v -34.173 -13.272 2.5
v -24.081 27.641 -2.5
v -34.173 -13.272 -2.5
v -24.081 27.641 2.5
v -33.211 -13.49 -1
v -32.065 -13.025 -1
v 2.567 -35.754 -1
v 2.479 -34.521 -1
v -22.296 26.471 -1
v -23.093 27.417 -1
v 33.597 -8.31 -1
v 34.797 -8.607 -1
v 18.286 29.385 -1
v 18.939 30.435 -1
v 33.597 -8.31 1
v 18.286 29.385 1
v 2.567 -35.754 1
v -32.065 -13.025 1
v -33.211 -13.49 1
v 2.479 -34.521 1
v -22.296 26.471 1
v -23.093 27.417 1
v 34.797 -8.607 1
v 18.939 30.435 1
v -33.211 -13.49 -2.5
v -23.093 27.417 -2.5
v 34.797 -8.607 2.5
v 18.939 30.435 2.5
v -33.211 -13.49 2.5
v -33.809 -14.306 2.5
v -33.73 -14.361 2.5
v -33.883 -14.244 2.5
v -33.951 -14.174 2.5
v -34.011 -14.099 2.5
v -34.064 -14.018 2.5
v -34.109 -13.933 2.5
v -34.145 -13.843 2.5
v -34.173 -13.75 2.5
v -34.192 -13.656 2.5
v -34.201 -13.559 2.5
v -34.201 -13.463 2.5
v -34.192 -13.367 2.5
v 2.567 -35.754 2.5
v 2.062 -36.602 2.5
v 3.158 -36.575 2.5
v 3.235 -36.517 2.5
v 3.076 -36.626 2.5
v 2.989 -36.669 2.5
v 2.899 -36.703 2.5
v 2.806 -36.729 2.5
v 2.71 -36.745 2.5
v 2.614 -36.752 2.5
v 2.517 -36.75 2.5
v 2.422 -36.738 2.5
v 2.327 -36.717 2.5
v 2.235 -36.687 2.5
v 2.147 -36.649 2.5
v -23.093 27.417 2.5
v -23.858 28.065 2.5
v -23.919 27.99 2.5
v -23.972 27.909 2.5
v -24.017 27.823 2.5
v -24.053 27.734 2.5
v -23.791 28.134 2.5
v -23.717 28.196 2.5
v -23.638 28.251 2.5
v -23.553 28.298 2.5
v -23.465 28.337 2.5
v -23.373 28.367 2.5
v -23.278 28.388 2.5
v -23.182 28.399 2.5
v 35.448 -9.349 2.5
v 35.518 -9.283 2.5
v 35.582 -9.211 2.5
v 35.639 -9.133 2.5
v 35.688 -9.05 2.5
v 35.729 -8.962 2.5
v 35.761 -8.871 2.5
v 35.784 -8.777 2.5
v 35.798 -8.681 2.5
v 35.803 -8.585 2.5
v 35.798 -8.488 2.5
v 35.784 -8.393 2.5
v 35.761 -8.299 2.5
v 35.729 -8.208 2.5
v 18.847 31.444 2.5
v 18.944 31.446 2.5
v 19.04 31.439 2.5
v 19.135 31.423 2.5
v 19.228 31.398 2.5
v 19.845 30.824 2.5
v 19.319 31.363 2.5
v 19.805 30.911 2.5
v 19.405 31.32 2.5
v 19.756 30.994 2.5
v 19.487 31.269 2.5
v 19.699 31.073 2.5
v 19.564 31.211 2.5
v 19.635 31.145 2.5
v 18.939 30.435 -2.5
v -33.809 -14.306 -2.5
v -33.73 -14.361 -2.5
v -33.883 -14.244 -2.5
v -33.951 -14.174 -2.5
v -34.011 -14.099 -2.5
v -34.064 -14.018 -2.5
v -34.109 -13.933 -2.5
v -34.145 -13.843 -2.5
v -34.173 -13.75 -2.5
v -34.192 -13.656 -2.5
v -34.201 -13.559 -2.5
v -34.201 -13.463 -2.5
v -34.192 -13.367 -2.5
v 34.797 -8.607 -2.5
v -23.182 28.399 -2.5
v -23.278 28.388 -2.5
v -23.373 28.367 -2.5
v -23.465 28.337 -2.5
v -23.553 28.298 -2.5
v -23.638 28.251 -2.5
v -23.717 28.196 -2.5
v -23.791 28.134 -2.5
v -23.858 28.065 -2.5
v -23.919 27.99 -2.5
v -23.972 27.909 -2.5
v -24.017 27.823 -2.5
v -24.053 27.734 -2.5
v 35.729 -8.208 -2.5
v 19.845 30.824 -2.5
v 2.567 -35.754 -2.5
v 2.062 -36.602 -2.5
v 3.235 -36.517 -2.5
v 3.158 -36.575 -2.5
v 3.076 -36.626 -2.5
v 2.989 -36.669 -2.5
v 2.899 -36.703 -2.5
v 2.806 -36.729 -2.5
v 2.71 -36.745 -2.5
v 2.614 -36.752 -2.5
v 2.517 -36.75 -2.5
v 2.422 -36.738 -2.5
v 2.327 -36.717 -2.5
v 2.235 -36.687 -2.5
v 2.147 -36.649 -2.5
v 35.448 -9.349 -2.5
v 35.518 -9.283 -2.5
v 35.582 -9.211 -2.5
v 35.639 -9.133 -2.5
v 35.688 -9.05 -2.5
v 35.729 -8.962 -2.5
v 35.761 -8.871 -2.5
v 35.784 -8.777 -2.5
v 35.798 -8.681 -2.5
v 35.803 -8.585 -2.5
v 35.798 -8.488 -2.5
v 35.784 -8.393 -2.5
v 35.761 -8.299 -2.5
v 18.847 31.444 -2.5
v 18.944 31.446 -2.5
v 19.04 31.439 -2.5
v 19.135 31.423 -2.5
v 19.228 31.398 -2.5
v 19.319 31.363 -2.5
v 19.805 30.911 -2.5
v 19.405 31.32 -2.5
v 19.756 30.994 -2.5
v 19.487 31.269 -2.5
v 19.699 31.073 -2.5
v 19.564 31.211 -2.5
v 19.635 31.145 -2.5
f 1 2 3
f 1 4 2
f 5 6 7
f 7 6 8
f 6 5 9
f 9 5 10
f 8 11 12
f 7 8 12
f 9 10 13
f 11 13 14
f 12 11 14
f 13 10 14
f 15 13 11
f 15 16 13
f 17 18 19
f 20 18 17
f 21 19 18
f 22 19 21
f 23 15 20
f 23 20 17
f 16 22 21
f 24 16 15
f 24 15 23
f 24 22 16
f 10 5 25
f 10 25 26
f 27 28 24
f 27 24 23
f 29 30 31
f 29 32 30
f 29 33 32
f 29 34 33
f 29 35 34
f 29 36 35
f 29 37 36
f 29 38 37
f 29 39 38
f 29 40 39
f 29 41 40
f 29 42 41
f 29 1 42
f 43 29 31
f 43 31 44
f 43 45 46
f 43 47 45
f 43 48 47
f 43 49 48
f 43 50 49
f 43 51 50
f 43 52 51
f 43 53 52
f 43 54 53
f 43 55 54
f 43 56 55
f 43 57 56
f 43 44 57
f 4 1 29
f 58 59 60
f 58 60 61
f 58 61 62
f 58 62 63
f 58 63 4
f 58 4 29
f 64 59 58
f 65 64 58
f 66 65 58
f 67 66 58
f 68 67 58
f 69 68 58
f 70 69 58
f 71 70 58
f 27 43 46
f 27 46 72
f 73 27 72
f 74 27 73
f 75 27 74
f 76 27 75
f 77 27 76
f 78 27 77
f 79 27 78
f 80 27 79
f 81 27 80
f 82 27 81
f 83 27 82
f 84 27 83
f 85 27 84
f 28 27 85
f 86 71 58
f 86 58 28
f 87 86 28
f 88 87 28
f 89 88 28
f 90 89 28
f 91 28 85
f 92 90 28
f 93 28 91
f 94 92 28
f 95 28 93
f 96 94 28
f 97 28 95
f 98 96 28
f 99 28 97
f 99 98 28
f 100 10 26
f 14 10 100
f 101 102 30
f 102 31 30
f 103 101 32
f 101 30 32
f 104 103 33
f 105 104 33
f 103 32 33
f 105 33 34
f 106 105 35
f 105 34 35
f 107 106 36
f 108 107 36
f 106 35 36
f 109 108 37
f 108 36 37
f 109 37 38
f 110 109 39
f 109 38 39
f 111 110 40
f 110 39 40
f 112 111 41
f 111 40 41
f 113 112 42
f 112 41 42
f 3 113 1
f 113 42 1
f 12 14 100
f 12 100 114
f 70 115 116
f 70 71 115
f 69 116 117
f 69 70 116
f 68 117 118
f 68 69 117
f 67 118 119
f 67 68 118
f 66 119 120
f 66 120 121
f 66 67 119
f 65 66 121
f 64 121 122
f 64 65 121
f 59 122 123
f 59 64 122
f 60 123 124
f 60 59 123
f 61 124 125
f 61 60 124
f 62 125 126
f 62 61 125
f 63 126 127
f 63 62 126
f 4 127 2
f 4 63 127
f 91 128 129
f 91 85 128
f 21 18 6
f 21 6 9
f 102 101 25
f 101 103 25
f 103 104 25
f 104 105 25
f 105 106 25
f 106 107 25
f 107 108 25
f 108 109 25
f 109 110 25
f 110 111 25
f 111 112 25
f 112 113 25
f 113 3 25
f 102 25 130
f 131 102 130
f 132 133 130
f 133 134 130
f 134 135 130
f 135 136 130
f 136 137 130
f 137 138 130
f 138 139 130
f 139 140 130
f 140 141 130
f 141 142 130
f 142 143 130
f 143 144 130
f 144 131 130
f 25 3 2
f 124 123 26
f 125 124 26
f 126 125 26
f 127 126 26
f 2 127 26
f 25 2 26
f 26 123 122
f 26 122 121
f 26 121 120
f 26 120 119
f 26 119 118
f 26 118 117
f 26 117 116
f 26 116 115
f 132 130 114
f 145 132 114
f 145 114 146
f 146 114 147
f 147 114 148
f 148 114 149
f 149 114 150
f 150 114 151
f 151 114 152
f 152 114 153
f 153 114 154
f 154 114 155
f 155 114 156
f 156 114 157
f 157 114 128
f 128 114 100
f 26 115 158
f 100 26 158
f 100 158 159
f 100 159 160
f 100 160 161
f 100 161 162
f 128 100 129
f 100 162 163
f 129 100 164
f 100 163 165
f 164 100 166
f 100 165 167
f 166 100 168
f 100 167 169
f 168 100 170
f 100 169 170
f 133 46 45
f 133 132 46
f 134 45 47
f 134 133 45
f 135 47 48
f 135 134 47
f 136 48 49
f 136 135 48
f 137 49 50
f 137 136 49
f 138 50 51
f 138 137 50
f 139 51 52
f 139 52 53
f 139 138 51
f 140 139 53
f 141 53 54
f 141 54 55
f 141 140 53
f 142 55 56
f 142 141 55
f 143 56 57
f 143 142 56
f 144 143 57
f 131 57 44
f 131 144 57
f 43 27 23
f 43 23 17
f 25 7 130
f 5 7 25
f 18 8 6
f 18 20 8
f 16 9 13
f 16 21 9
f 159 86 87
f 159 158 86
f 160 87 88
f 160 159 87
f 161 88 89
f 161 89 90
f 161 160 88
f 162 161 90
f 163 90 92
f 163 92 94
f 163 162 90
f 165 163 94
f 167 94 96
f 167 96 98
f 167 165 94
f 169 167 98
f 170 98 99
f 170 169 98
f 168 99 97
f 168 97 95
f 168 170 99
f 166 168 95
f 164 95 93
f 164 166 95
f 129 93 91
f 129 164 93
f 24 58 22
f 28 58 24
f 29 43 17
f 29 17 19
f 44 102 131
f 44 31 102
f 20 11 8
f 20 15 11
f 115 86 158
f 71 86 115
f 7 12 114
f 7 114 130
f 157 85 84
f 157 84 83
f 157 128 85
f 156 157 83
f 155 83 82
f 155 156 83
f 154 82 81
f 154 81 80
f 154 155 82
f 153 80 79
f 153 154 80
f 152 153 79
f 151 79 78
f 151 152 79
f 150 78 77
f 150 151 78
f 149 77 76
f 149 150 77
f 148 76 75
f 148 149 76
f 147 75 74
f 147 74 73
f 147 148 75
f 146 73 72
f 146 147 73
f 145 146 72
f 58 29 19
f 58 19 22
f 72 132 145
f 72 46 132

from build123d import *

# Parameters (mm, degrees)
F1_DEPTH = 1
F2_DEPTH = 2.5
F3_R     = 1


with BuildPart() as f1:
    # F0 (on Top) → F1 (new body, symmetric)
    with BuildSketch(Plane.XY):
        Polygon((19.571643256, 31.4964826728), (-23.9069647124, 28.3466872622), (-34.3469600161, -13.9772664763), (2.6793760122, -36.9851130144), (36.0029054603, -8.8807904443), align=None)
        Polygon((-33.2106868902, -13.4901422574), (-23.0925543436, 27.4165569635), (18.9387034188, 30.4345063154), (34.7973167593, -8.6069976298), (2.5672210558, -35.7539233917), align=None, mode=Mode.SUBTRACT)
        Polygon((18.9387034188, 30.4345063154), (-23.0925543436, 27.4165569635), (-33.2106868902, -13.4901422574), (2.5672210558, -35.7539233917), (34.7973167593, -8.6069976298), align=None)
        Polygon((-32.949379101, -13.3121576596), (-22.8425323844, 27.2230387533), (18.8319176983, 30.1369208862), (34.4812975953, -8.5973973294), (2.4786961918, -35.4504046505), align=None, mode=Mode.SUBTRACT)
        Polygon((18.8319176983, 30.1369208862), (-22.8425323844, 27.2230387533), (-32.949379101, -13.3121576596), (2.4786961918, -35.4504046505), (34.4812975953, -8.5973973294), align=None)
        Polygon((-32.0654907905, -13.0249649382), (-22.2962593663, 26.4711584475), (18.2856446802, 29.3850405804), (33.5974092848, -8.310204608), (2.4786961918, -34.5210294816), align=None, mode=Mode.SUBTRACT)
    extrude(amount=F1_DEPTH, both=True)

    # F0 (on Top) → F2 (join, symmetric)
    with BuildSketch(Plane.XY):
        Polygon((19.571643256, 31.4964826728), (-23.9069647124, 28.3466872622), (-34.3469600161, -13.9772664763), (2.6793760122, -36.9851130144), (36.0029054603, -8.8807904443), align=None)
        Polygon((-33.2106868902, -13.4901422574), (-23.0925543436, 27.4165569635), (18.9387034188, 30.4345063154), (34.7973167593, -8.6069976298), (2.5672210558, -35.7539233917), align=None, mode=Mode.SUBTRACT)
    extrude(amount=F2_DEPTH, both=True)

    # F3
    f3_edges = [f1.edges().sort_by_distance(p)[0] for p in [
        (36.002905, -8.88079, 0),
        (2.679376, -36.985113, 0),
        (-34.34696, -13.977266, 0),
        (-23.906965, 28.346687, 0),
        (19.571643, 31.496483, 0),
    ]]
    fillet(f3_edges, radius=F3_R)


solid = f1.part
